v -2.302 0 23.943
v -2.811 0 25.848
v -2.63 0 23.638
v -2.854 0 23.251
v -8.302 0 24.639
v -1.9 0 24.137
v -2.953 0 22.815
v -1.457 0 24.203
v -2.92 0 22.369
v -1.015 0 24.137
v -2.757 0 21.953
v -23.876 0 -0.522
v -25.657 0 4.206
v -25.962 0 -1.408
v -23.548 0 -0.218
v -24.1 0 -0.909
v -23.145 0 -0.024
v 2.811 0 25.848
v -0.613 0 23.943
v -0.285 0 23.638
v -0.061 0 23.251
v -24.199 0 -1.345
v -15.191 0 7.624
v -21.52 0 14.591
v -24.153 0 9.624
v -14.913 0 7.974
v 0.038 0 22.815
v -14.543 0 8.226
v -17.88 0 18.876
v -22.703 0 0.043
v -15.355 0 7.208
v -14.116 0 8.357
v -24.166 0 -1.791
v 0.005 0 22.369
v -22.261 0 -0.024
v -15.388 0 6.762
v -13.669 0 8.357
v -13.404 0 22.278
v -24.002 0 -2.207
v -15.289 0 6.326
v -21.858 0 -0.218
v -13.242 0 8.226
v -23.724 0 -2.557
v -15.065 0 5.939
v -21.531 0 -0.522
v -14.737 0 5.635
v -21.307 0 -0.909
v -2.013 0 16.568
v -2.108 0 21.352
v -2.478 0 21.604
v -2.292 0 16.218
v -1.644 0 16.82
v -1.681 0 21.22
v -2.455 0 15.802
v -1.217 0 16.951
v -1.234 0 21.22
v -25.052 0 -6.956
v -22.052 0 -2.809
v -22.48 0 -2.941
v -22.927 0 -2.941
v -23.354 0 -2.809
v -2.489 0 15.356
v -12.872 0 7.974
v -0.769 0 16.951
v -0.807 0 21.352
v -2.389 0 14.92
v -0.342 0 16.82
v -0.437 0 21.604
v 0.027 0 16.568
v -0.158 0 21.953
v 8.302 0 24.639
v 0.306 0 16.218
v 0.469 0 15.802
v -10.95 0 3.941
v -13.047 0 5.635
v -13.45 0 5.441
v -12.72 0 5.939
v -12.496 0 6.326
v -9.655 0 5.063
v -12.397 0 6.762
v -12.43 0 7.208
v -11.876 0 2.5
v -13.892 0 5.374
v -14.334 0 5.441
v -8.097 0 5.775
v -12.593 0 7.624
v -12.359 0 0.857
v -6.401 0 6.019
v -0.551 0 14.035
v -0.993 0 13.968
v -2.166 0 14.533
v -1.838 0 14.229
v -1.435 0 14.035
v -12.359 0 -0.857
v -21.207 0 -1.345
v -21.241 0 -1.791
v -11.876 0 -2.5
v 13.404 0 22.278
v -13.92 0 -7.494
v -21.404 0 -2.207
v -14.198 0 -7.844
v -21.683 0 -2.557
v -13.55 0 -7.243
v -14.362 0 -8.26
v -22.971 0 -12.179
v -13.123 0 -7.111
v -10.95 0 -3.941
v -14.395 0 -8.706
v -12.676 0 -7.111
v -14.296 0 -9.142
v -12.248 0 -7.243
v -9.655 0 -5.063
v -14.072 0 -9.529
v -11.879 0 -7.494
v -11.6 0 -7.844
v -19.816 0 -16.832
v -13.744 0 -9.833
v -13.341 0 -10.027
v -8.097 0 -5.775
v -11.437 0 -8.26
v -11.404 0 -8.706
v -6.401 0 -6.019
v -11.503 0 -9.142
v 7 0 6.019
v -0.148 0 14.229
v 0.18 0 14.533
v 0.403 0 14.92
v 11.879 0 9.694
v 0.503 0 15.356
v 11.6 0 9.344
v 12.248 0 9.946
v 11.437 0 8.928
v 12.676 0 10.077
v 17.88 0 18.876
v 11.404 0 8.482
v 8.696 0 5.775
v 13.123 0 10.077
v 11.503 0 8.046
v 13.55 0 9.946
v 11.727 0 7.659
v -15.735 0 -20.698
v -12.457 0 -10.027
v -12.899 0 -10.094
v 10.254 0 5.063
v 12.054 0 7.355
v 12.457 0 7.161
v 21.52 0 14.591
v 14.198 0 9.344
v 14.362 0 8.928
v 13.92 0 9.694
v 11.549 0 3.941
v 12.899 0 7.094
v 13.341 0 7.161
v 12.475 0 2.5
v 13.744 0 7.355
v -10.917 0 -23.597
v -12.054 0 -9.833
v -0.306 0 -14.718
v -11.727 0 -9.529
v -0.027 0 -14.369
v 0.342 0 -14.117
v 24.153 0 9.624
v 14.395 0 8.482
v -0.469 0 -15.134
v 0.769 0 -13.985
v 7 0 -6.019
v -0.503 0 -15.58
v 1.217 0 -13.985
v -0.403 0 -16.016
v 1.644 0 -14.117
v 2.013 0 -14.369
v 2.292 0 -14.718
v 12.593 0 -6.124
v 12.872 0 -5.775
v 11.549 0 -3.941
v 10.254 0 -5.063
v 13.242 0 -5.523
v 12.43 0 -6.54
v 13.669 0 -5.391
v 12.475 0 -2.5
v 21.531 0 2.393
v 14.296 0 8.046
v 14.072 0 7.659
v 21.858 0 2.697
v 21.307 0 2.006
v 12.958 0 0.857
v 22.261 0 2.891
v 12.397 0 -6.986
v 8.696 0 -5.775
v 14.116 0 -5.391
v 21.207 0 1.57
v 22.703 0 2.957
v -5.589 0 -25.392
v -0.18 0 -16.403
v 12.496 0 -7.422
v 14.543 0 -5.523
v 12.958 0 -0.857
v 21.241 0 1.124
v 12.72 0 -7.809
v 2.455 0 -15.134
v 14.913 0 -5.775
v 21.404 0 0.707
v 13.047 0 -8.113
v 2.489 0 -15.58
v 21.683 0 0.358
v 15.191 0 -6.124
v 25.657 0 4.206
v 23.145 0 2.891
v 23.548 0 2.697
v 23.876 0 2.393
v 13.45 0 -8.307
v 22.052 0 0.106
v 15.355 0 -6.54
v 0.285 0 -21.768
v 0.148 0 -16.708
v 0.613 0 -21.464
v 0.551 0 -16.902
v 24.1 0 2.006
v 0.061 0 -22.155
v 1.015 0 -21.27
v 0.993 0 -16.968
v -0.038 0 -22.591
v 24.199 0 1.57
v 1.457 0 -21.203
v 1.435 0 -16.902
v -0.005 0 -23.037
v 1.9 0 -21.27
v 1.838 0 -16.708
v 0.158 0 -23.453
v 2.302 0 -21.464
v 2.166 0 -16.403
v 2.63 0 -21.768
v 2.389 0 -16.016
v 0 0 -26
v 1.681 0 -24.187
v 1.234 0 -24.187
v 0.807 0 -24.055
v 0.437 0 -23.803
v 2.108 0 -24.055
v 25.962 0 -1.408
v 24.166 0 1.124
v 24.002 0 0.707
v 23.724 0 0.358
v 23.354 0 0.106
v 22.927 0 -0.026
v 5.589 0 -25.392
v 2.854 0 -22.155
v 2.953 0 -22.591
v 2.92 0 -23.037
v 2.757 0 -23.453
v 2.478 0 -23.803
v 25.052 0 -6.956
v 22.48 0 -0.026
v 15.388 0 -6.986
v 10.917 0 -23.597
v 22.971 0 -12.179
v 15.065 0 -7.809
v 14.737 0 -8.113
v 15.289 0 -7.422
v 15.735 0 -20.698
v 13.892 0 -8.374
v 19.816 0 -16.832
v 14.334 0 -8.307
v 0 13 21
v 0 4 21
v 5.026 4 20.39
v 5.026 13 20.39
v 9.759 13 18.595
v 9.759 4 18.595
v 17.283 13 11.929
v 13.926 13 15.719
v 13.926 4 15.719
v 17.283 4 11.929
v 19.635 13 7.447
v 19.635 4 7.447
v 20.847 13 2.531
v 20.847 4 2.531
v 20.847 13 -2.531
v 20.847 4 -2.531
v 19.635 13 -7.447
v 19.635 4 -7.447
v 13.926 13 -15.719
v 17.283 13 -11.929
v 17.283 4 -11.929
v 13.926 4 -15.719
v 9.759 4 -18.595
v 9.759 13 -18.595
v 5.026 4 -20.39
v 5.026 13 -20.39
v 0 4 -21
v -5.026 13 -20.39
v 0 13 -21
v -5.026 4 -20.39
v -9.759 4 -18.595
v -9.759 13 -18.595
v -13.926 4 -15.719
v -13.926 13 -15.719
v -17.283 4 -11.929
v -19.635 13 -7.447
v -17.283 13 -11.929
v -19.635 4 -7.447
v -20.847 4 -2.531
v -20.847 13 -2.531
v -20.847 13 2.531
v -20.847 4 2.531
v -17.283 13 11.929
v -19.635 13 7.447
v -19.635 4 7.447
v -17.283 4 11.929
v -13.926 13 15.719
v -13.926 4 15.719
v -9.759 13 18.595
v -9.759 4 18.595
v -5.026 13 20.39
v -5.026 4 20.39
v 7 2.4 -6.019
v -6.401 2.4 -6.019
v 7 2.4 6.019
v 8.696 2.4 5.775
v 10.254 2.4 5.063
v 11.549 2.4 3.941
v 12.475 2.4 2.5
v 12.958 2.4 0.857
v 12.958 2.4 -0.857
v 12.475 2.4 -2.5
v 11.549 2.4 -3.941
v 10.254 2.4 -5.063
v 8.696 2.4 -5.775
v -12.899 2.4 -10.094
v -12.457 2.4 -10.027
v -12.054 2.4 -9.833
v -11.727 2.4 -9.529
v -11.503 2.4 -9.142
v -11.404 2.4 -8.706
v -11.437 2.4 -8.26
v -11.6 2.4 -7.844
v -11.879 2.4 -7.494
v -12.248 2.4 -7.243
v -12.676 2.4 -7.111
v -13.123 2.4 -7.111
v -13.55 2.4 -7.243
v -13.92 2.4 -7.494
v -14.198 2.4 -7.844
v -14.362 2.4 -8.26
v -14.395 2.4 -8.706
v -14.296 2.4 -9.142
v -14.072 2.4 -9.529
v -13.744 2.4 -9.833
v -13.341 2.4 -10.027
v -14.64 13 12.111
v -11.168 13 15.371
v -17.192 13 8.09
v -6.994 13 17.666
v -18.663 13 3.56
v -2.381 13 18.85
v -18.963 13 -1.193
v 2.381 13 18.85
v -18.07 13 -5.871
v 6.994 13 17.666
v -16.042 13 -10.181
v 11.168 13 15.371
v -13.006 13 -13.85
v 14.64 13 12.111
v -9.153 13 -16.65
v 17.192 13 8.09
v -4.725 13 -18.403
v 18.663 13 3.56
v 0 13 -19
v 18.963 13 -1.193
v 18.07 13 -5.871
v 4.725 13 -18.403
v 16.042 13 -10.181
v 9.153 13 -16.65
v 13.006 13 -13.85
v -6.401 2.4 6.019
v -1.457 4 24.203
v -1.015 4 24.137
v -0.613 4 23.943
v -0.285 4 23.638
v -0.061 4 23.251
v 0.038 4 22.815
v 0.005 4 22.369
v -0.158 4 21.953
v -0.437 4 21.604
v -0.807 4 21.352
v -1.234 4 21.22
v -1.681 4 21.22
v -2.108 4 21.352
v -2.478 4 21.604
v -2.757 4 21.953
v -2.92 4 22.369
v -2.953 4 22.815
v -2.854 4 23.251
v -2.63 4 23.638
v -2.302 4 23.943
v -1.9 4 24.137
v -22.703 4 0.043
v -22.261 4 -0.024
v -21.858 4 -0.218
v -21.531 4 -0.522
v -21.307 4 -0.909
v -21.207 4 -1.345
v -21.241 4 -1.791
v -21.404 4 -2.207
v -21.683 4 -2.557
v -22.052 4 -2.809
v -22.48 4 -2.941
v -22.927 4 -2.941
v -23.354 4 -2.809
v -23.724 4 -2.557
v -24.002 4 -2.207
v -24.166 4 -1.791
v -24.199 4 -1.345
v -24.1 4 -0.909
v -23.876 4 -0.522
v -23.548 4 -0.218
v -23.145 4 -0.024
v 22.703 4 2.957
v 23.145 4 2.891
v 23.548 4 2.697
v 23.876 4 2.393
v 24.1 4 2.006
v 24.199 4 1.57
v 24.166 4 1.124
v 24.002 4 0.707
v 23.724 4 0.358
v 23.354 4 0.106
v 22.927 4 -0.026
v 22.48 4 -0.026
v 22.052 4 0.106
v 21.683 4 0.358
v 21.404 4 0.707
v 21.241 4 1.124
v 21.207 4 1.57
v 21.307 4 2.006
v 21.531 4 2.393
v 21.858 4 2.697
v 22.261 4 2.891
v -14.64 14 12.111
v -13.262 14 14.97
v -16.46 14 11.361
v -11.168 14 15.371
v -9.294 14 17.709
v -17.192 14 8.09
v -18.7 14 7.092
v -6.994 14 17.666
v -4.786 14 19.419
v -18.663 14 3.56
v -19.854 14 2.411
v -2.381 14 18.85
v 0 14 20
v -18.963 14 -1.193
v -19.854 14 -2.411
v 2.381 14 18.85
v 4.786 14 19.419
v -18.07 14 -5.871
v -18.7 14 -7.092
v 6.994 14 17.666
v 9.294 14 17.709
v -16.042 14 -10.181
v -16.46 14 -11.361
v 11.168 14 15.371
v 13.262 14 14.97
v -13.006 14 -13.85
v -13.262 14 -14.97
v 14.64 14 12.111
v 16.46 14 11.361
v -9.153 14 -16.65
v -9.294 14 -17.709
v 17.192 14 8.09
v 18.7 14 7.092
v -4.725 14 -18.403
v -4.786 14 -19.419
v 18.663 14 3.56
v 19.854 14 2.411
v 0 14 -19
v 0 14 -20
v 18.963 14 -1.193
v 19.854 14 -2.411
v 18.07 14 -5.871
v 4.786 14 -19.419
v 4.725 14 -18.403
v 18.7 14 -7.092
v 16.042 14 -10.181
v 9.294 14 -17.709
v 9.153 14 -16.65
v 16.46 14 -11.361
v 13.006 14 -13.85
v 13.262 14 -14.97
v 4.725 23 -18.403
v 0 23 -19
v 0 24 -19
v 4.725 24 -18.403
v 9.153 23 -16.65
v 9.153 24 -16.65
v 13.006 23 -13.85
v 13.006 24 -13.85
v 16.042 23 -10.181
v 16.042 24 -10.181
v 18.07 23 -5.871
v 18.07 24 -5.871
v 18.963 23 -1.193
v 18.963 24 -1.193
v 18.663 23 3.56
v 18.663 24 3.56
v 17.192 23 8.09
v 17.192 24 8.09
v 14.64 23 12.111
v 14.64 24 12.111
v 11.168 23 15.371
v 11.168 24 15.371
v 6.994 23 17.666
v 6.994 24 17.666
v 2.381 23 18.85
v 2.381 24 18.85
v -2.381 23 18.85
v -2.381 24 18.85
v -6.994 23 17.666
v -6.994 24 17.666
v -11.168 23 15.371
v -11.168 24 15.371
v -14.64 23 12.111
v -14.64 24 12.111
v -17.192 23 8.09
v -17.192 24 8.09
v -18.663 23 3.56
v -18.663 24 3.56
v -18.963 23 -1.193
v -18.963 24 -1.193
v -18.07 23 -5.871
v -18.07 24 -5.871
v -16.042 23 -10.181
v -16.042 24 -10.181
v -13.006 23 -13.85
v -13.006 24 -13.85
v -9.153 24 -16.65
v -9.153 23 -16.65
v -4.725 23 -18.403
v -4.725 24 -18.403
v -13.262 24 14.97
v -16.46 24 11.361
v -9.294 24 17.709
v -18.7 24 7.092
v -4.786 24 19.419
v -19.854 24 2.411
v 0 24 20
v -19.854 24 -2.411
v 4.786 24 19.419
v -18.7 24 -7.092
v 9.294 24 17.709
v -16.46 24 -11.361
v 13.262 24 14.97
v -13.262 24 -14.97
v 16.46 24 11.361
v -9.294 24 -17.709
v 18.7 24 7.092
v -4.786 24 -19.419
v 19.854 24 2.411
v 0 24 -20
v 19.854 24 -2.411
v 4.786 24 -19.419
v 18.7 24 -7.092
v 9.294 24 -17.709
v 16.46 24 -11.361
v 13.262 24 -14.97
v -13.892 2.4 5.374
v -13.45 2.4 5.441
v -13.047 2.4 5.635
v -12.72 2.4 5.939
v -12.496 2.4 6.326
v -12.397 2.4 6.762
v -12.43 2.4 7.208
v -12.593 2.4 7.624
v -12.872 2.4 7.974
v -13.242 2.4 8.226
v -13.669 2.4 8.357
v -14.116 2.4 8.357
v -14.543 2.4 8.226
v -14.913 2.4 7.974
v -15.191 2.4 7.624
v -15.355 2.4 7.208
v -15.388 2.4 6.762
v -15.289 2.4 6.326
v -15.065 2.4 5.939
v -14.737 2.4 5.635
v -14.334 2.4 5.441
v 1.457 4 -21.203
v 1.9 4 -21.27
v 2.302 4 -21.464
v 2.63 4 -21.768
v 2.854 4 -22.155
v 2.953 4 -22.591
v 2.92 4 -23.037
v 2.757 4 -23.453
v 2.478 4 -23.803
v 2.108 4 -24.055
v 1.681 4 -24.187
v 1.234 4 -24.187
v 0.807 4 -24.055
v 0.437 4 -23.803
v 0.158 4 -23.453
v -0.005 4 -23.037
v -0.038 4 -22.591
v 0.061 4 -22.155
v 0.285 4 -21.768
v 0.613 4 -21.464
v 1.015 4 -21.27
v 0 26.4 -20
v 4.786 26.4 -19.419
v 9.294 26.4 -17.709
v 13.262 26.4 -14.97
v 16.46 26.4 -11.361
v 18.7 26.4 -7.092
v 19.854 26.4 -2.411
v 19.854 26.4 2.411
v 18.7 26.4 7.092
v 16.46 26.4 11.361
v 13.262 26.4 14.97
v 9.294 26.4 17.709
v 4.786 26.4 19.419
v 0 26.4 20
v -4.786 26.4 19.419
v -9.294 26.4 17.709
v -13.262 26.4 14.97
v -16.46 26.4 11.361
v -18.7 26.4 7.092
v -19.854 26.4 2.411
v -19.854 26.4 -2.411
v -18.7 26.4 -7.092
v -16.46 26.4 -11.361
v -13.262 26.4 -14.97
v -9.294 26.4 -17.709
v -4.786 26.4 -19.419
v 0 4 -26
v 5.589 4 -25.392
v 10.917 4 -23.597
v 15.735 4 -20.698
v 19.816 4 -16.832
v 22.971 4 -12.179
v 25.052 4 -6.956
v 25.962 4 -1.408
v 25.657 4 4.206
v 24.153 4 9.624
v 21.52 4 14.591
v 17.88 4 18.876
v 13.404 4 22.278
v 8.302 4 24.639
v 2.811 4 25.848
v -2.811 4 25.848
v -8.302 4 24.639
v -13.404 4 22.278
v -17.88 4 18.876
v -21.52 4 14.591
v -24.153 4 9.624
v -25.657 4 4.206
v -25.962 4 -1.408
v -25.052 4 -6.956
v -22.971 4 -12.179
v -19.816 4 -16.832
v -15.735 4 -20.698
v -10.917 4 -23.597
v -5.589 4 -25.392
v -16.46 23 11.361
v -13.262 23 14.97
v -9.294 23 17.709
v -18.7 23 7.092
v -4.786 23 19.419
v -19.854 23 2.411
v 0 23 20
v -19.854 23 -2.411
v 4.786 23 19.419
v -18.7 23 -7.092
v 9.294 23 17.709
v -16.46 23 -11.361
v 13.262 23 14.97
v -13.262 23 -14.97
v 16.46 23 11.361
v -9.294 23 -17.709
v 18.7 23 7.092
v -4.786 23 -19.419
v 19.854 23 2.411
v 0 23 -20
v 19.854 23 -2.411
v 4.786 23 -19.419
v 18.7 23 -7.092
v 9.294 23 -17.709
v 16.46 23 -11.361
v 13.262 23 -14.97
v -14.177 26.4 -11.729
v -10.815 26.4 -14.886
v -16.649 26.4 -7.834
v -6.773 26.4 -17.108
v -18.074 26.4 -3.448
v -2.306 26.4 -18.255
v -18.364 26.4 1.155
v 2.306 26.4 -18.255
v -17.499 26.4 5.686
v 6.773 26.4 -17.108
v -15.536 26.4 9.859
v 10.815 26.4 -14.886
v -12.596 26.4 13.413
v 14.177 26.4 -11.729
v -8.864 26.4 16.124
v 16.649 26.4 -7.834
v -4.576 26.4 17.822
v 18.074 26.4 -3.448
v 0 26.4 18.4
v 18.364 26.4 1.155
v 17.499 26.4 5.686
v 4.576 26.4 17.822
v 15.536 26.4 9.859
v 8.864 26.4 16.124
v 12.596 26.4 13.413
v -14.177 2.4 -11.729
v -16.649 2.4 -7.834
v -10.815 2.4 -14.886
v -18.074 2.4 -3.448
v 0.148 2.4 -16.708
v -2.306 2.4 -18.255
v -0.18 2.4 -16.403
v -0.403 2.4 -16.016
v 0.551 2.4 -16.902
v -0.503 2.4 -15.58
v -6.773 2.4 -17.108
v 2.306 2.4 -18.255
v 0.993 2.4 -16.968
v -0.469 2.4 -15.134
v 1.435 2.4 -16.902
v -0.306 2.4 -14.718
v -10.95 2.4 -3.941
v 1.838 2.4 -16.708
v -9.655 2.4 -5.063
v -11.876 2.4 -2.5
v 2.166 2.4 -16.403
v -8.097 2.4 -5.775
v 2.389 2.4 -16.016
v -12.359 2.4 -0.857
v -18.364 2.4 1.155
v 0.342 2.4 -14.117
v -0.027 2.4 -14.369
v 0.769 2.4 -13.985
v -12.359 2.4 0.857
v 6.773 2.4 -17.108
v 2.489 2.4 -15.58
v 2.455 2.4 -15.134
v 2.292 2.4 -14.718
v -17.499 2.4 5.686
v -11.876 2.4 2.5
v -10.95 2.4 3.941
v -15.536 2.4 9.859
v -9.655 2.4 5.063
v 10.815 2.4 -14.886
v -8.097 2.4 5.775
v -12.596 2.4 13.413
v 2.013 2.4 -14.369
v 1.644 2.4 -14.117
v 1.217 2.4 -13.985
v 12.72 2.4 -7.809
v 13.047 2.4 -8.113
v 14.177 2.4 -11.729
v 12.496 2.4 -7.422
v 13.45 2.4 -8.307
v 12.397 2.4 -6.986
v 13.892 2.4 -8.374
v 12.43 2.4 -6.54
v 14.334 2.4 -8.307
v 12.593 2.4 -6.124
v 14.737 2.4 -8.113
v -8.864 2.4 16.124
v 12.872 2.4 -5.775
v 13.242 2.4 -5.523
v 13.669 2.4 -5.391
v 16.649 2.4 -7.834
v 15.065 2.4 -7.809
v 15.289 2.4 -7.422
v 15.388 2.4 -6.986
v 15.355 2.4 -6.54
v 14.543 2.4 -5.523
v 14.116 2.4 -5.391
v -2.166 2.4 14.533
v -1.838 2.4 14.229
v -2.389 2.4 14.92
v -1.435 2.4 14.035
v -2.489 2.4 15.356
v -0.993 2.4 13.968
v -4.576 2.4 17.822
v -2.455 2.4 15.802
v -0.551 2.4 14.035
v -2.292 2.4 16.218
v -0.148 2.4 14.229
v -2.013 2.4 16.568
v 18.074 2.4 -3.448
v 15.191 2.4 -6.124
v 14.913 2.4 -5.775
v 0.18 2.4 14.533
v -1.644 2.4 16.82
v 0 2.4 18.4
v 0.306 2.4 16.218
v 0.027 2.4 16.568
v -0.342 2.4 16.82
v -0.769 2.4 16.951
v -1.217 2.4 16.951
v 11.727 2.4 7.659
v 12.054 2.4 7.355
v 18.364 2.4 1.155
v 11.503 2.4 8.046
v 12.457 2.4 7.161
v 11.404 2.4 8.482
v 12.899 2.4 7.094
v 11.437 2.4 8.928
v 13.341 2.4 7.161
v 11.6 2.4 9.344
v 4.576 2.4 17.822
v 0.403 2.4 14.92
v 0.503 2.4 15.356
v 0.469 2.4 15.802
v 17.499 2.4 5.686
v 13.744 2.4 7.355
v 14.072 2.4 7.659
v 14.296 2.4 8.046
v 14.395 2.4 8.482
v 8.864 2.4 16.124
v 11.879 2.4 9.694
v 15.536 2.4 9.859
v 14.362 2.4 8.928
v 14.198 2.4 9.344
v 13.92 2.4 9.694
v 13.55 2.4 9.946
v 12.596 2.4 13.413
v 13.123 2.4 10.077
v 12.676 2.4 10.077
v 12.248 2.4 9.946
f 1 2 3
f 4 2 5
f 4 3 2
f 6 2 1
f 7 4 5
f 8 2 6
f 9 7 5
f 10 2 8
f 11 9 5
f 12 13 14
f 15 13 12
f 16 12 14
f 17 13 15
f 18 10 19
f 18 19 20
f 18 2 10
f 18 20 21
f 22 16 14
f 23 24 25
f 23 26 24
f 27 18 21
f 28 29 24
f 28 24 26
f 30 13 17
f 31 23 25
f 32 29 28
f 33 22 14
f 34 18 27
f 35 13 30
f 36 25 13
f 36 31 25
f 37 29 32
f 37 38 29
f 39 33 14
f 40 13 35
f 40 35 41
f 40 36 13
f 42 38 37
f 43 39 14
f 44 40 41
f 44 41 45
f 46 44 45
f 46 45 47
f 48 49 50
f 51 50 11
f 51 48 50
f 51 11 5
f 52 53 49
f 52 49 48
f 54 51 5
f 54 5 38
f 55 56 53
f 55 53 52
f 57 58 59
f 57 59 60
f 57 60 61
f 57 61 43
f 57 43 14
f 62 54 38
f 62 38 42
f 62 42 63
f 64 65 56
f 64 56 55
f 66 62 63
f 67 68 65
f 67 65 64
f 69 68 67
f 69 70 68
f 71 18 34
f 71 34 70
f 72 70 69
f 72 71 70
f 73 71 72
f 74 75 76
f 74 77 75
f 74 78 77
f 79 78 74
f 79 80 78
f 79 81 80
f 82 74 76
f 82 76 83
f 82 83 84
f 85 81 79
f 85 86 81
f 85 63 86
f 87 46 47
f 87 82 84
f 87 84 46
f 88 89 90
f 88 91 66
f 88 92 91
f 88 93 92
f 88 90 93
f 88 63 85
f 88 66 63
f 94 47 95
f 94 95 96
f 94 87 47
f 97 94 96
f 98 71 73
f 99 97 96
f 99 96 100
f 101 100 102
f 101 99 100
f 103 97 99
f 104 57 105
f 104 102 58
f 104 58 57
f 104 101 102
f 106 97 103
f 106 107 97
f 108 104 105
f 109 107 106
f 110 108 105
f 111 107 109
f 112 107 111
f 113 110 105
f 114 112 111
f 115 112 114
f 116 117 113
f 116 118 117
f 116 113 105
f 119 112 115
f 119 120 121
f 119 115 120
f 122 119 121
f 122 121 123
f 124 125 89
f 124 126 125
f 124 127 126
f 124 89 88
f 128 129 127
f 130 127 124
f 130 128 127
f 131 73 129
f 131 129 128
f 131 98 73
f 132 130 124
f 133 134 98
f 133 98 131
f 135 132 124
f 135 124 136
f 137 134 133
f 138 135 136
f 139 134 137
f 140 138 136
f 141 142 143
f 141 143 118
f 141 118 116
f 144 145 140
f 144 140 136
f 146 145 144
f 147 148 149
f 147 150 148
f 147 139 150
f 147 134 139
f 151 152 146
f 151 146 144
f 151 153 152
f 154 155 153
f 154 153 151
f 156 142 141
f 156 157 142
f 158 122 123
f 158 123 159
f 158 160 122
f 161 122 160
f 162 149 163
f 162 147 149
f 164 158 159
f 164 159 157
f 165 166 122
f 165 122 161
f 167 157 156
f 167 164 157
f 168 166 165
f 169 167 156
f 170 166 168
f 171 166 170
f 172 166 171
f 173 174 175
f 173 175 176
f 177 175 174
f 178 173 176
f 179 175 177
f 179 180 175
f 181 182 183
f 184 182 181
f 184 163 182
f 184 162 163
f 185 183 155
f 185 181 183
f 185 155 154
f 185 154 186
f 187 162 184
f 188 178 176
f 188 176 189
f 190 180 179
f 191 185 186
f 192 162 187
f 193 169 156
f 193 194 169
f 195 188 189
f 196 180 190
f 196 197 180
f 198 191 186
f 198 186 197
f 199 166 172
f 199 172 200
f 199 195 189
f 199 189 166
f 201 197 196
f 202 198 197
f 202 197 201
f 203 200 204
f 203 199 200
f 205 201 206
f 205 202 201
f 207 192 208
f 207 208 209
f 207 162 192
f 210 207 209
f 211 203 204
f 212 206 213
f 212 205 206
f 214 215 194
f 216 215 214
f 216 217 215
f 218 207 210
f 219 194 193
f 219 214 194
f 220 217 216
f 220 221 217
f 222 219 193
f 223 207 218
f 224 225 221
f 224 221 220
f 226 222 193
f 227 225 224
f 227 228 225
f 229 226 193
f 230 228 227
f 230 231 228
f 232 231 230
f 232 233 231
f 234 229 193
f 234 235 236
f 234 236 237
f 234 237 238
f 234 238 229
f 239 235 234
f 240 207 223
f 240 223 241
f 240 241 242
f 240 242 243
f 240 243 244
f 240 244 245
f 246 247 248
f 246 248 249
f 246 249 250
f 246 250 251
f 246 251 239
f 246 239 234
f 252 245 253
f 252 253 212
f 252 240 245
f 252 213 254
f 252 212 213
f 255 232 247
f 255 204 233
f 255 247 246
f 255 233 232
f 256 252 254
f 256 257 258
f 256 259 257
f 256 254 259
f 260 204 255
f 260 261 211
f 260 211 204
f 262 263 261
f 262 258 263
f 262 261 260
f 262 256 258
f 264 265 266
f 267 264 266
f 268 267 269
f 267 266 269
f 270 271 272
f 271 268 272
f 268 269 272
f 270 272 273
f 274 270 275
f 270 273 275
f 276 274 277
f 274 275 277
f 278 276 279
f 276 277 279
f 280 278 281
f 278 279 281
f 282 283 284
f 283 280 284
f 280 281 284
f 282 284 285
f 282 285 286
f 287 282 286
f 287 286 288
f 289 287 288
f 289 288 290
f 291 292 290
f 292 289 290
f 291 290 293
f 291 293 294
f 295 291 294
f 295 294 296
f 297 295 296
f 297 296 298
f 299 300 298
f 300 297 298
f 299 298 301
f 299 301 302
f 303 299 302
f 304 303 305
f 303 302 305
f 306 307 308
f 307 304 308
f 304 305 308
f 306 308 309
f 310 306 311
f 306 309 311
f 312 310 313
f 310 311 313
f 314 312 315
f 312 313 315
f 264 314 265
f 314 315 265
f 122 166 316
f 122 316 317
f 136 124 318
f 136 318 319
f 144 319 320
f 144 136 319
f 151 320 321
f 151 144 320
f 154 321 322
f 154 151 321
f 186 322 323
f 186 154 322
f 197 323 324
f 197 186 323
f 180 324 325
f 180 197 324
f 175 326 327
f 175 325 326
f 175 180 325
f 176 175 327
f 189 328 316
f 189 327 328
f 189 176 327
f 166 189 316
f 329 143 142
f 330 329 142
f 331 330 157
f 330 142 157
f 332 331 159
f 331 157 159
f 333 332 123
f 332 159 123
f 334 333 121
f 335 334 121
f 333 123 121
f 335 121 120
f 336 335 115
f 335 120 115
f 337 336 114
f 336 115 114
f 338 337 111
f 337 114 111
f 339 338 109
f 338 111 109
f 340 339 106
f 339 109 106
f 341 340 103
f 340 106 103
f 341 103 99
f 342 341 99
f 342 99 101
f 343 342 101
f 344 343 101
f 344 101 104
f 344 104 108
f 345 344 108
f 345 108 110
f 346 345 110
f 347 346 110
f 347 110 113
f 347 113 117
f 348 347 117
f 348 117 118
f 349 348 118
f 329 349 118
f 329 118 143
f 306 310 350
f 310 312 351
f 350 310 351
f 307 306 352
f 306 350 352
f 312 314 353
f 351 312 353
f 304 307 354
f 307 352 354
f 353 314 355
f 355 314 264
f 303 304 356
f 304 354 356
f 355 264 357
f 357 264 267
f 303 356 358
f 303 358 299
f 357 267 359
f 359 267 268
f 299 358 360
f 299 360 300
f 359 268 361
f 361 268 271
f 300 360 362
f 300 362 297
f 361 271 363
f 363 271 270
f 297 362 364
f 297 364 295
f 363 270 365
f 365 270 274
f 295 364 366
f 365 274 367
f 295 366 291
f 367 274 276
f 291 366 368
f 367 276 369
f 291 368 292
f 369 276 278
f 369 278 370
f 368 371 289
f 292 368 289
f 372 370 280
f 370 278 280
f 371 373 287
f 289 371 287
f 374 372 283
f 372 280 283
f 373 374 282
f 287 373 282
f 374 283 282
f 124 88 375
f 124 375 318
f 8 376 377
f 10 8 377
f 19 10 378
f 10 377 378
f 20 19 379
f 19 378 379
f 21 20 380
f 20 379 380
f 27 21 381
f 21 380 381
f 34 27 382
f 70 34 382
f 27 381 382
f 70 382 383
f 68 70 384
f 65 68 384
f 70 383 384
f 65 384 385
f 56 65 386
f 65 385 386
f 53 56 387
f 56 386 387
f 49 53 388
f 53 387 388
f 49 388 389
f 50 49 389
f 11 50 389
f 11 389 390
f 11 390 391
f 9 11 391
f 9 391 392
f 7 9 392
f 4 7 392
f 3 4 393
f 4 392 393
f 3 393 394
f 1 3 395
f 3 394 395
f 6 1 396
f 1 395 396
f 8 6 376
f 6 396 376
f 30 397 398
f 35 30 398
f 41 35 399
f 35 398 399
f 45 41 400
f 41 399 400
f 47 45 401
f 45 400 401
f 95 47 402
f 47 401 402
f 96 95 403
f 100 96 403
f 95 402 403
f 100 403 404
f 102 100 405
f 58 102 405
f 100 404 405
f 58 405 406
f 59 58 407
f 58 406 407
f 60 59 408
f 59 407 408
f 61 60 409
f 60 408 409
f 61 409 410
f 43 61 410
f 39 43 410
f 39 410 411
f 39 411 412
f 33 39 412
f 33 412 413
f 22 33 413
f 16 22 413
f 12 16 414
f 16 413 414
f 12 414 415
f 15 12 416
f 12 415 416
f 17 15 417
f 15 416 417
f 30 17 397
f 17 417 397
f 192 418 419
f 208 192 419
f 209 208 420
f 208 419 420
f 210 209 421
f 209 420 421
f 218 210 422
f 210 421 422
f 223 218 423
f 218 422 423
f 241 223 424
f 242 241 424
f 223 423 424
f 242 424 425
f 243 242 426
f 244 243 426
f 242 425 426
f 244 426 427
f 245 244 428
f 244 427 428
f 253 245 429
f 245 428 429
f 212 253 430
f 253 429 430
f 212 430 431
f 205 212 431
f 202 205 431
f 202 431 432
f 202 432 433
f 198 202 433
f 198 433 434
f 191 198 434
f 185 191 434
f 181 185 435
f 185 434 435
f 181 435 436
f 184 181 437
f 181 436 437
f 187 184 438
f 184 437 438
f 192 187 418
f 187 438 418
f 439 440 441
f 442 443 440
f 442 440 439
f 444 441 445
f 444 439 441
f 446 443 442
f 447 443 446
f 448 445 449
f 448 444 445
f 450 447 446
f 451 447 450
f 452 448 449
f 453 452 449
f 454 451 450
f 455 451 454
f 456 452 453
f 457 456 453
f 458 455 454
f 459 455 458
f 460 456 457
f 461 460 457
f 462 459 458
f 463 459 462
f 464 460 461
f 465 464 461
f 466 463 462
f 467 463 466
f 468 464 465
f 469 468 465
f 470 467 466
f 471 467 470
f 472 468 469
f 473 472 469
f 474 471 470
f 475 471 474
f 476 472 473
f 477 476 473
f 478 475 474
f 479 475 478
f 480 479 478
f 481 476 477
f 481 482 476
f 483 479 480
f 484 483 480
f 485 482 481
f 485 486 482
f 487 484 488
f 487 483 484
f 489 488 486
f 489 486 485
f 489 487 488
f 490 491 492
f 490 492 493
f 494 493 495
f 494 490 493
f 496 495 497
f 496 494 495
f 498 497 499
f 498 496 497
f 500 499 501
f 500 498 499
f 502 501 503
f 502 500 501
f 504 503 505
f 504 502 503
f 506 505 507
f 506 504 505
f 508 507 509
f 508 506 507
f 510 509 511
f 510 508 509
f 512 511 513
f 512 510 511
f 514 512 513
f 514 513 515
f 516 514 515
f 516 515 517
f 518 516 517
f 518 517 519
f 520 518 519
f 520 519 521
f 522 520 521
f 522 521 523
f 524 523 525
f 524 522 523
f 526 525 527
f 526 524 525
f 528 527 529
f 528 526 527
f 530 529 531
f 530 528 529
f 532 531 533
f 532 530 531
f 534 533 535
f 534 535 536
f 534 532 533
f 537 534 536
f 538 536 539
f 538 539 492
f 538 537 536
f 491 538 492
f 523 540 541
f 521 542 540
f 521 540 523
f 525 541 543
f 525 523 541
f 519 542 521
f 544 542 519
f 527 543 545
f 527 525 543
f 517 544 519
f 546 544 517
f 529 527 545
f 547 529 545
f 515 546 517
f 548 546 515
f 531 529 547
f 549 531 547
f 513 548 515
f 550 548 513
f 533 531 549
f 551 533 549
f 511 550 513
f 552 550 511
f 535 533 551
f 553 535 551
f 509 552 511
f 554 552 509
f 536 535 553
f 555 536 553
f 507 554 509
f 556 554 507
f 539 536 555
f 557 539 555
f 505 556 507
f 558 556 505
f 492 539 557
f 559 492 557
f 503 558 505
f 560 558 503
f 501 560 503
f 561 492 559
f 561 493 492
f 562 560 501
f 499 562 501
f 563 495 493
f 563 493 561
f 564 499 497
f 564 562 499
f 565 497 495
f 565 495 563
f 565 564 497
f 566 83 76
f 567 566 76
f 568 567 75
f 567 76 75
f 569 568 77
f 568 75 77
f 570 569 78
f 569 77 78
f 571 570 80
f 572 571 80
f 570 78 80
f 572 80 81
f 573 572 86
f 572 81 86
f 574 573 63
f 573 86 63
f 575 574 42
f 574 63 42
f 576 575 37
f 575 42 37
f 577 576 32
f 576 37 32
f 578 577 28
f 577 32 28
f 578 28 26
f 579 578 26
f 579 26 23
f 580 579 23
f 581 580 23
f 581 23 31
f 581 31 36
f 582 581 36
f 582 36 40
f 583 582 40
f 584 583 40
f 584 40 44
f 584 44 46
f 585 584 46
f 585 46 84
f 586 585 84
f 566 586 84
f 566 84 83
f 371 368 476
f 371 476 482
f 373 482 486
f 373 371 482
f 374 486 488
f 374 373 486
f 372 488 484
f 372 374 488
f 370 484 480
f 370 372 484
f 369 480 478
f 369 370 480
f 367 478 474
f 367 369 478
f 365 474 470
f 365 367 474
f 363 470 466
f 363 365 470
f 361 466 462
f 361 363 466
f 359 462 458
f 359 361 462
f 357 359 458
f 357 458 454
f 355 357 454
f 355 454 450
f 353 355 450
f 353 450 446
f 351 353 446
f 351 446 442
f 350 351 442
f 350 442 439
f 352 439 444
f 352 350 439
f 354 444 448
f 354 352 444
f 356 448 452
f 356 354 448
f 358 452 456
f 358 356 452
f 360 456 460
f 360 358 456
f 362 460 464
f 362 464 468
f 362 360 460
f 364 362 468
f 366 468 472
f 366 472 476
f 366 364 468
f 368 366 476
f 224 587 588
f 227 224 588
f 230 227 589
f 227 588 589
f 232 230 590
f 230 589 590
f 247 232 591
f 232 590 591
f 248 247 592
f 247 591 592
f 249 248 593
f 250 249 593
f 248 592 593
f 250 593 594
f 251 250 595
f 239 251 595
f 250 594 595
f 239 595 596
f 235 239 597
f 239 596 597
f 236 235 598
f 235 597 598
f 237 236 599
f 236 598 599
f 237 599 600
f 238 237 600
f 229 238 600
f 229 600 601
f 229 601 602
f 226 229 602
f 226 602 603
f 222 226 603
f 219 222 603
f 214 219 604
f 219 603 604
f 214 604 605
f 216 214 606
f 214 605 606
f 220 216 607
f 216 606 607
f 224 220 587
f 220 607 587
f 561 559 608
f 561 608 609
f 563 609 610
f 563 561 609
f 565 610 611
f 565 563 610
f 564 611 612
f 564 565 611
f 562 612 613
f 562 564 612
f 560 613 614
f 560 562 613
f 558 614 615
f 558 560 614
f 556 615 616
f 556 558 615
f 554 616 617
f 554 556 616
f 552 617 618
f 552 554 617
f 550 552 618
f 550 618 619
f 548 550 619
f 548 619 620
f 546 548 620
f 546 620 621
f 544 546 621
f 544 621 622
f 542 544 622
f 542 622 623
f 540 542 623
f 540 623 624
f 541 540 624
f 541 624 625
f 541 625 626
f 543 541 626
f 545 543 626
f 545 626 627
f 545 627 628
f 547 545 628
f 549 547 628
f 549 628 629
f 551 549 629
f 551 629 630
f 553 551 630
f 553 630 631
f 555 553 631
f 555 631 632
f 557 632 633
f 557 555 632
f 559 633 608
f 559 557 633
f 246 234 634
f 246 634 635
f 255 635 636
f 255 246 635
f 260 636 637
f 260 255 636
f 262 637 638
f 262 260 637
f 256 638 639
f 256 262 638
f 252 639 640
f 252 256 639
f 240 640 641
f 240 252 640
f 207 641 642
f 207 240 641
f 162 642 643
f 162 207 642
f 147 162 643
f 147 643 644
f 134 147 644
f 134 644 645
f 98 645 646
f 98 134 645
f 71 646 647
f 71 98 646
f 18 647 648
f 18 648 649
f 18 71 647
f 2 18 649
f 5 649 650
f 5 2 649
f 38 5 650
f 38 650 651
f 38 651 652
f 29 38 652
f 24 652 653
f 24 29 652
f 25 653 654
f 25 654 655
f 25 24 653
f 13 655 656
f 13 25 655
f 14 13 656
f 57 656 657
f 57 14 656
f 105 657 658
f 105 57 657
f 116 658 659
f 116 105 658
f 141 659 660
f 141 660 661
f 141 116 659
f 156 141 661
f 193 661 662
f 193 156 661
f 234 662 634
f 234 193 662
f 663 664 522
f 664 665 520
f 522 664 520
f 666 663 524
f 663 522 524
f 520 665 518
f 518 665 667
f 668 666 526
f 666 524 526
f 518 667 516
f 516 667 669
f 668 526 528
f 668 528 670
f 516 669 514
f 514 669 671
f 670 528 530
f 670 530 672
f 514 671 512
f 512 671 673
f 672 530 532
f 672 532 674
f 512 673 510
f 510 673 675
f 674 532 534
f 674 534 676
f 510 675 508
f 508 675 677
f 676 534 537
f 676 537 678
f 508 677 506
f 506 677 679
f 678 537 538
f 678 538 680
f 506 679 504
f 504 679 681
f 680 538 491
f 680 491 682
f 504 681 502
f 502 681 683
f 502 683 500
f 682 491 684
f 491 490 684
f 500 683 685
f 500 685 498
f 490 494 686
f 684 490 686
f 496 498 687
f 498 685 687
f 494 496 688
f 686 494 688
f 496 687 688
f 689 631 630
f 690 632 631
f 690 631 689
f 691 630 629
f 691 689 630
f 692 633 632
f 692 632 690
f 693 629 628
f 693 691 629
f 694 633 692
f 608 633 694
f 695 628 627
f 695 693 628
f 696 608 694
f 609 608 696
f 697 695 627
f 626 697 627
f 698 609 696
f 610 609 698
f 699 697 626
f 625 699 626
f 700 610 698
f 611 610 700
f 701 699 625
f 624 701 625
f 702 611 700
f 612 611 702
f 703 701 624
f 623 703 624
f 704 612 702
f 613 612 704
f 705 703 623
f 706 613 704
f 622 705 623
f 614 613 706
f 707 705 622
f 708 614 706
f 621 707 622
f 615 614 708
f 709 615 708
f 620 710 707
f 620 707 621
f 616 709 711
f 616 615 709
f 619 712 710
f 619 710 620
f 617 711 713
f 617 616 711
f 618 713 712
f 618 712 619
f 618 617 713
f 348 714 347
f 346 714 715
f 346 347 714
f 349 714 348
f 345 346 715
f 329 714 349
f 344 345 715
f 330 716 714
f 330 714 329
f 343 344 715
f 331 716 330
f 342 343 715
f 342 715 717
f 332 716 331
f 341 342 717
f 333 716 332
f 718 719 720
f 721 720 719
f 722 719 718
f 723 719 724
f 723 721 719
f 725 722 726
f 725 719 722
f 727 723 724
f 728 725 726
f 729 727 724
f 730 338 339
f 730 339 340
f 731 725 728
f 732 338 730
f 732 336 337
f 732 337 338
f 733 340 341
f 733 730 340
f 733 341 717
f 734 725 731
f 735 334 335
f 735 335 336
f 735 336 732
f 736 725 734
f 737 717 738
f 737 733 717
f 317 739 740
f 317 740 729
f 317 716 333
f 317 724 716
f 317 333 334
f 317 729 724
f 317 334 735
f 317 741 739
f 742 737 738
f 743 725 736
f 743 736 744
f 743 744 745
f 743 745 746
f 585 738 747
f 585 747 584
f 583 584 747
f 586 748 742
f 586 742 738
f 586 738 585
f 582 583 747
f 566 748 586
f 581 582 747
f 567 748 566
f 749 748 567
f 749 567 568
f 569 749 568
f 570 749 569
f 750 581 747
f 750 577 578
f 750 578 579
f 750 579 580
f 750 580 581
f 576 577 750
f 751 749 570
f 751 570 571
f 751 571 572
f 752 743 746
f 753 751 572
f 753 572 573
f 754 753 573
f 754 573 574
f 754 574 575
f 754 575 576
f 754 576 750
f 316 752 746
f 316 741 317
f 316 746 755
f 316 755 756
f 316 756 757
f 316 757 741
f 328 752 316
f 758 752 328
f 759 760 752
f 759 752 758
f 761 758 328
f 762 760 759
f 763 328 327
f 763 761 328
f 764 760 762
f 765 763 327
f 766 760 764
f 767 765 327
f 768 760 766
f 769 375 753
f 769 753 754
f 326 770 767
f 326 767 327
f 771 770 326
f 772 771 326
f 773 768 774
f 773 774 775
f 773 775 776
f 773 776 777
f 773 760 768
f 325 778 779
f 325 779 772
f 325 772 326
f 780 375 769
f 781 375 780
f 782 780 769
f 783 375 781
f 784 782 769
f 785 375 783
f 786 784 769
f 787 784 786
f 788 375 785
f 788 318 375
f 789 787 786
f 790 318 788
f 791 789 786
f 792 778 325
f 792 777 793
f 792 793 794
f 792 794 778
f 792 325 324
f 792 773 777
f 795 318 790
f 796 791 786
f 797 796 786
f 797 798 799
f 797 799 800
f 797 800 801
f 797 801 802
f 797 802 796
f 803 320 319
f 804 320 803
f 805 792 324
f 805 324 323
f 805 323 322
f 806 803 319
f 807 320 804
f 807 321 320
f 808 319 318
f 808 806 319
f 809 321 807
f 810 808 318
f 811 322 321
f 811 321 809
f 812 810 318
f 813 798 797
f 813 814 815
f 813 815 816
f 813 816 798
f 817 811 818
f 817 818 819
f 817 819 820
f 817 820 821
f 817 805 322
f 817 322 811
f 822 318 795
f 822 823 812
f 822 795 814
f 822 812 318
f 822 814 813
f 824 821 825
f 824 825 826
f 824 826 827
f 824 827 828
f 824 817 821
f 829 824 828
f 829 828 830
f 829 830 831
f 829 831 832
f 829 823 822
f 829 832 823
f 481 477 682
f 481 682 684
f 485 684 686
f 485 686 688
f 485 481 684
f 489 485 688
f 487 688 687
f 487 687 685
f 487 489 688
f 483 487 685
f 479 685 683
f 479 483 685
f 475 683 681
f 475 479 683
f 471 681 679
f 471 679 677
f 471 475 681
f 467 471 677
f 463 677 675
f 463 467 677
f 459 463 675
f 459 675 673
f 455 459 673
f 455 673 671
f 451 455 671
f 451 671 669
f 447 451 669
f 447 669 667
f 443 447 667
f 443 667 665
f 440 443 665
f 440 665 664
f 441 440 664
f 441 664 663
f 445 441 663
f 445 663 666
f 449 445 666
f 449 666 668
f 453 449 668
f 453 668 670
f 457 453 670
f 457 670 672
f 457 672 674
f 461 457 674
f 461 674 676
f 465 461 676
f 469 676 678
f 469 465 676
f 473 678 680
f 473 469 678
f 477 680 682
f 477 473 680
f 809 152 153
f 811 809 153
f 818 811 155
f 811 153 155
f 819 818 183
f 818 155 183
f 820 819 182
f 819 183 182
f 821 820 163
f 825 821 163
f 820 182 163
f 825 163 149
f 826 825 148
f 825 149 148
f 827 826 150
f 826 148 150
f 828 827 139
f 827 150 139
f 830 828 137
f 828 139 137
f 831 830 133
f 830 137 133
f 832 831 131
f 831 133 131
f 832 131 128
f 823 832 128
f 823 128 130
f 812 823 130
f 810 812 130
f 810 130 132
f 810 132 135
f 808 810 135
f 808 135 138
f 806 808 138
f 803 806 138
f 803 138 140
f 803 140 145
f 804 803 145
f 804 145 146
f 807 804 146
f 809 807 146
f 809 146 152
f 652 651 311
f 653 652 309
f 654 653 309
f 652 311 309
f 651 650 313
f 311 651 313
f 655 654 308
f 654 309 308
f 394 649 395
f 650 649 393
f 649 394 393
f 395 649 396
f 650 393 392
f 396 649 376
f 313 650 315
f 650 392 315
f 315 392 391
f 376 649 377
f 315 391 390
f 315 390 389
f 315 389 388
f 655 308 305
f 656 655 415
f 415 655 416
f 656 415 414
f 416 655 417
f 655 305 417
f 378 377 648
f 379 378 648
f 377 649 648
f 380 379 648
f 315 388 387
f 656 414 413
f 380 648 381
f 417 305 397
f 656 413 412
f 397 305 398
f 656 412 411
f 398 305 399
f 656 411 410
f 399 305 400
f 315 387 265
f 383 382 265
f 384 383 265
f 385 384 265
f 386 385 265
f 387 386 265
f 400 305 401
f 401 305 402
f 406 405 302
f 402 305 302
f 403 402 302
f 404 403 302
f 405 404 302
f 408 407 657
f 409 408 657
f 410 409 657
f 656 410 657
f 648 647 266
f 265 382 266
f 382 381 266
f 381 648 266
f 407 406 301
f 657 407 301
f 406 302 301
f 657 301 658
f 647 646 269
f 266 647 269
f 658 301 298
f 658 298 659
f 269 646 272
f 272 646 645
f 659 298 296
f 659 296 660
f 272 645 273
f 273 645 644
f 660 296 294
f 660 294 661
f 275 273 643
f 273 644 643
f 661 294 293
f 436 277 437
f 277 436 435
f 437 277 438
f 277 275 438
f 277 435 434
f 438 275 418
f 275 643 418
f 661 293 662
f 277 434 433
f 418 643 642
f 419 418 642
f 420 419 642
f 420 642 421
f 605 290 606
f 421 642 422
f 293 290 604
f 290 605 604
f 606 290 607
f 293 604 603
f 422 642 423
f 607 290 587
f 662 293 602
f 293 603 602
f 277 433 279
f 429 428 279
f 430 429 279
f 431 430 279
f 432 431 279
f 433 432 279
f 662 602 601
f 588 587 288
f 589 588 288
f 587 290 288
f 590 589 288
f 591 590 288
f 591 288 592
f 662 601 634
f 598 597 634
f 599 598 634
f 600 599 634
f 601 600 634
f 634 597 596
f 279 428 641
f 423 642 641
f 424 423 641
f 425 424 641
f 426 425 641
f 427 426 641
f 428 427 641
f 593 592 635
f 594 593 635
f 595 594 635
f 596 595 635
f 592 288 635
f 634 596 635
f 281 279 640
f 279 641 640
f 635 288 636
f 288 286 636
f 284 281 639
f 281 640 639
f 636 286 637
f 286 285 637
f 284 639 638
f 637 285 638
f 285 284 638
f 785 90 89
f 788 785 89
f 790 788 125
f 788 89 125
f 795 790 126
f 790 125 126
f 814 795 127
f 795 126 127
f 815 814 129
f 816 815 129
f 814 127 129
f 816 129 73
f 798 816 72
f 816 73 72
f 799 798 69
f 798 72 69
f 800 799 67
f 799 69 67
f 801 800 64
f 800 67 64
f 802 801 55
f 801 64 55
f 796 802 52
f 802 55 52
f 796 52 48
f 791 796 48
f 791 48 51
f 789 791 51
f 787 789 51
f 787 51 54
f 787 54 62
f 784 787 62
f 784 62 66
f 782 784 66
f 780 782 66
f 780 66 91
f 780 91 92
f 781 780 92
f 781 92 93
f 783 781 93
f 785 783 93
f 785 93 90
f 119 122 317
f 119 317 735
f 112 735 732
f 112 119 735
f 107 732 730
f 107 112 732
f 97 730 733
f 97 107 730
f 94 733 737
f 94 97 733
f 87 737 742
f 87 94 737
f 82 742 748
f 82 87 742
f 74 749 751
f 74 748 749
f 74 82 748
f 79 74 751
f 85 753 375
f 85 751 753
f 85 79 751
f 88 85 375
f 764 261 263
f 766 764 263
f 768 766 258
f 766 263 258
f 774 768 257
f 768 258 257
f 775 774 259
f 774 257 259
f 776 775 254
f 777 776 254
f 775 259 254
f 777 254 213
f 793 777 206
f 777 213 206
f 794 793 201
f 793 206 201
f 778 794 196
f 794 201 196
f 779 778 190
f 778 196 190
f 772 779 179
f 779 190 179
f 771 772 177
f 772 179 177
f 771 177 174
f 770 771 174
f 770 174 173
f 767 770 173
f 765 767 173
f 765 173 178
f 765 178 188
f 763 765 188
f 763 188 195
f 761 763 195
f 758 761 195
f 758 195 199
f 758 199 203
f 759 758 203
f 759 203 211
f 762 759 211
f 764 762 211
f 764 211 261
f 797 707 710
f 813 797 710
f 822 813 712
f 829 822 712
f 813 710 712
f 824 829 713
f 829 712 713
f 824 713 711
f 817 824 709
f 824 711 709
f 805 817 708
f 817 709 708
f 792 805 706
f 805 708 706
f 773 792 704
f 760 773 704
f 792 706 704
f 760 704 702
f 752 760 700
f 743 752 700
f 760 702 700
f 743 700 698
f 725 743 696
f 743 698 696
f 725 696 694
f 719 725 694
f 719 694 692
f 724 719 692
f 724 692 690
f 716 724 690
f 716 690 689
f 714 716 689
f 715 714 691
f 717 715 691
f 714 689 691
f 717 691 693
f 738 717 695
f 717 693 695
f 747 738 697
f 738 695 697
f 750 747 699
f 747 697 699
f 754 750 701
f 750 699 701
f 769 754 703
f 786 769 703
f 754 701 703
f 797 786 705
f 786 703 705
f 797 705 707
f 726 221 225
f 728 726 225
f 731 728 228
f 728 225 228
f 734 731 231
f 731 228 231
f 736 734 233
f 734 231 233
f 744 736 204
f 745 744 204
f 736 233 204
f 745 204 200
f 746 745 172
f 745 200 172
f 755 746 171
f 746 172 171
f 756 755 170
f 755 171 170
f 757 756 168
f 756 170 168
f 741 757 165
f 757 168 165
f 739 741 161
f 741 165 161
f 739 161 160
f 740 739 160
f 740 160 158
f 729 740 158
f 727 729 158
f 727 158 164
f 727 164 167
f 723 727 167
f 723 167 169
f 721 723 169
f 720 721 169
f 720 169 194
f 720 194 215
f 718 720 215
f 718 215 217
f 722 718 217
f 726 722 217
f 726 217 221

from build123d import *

# Parameters (mm, degrees)
SKETCH_1_R           = 21
EXTRUDE_2_DEPTH      = 26.4
SKETCH_10_R          = 18.4
CUT_EXTRUDE_5_DEPTH  = 24
SKETCH_11_R          = 1.5
CUT_EXTRUDE_6_DEPTH  = 24
EXTRUDE_START        = 4
SKETCH_13_R          = 24.5
SKETCH_13_R_2        = 21
EXTRUDE_4_DEPTH      = 4
SKETCH_14_R          = 1.5
CUT_EXTRUDE_7_DEPTH  = 4
SKETCH_16_R          = 21
SKETCH_16_R_2        = 19
CUT_EXTRUDE_10_DEPTH = 1
SKETCH_27_R          = 21
SKETCH_27_R_2        = 20
CUT_EXTRUDE_14_DEPTH = 20
SKETCH_29_R          = 20
SKETCH_29_R_2        = 19
CUT_EXTRUDE_15_DEPTH = 1
CUT_EXTRUDE_16_DEPTH = 10
SKETCH_32_R          = 26
SKETCH_32_R_2        = 24.5
EXTRUDE_5_DEPTH      = 4


with BuildPart() as part:
    # 草图1 → 凸台-拉伸2 (new body)
    with BuildSketch(Plane(origin=(0, 0, 0), x_dir=(1, 0, 0), z_dir=(0, 1, 0))):
        with Locations(Location((0, 0, 0), (0, 0, 270))):
            Circle(SKETCH_1_R)
    extrude(amount=EXTRUDE_2_DEPTH)

    # 草图10 → 切除-拉伸5 (cut)
    with BuildSketch(Plane(origin=(0, 26.4, 0), x_dir=(1, 0, 0), z_dir=(0, 1, 0))):
        with Locations(Location((0, 0, 0), (0, 0, 270))):
            Circle(SKETCH_10_R)
    extrude(amount=-CUT_EXTRUDE_5_DEPTH, mode=Mode.SUBTRACT)

    # 草图11 → 切除-拉伸6 (cut)
    with BuildSketch(Plane.XZ):
        with Locations(Location((-0.993017559, 15.468158136, 0), (0, 0, 270))):
            Circle(SKETCH_11_R)
        with Locations(Location((12.899309116, 8.594057501, 0), (0, 0, 270))):
            Circle(SKETCH_11_R)
        with Locations(Location((13.892326675, -6.874100635, 0), (0, 0, 270))):
            Circle(SKETCH_11_R)
        with Locations(Location((0.993017559, -15.468158136, 0), (0, 0, 270))):
            Circle(SKETCH_11_R)
        with Locations(Location((-12.899309116, -8.594057501, 0), (0, 0, 270))):
            Circle(SKETCH_11_R)
        with Locations(Location((-13.892326675, 6.874100635, 0), (0, 0, 270))):
            Circle(SKETCH_11_R)
    extrude(amount=-CUT_EXTRUDE_6_DEPTH, mode=Mode.SUBTRACT)

    # 草图13 → 凸台-拉伸4 (add)
    with BuildSketch(Plane(origin=(0, 4, 0), x_dir=(-1, 0, 0), z_dir=(0, -1, 0)).offset(EXTRUDE_START)):
        with Locations(Location((0, 0, 0), (0, 0, 90))):
            Circle(SKETCH_13_R)
        with Locations(Location((0, 0, 0), (0, 0, 90))):
            Circle(SKETCH_13_R_2, mode=Mode.SUBTRACT)
    extrude(amount=-EXTRUDE_4_DEPTH)

    # 草图14 → 切除-拉伸7 (cut)
    with BuildSketch(Plane(origin=(0, 4, 0), x_dir=(1, 0, 0), z_dir=(0, 1, 0))):
        with Locations(Location((1.457493515, 22.703264361, 0), (0, 0, 270))):
            Circle(SKETCH_14_R)
        with Locations(Location((22.703264361, -1.457493515, 0), (0, 0, 270))):
            Circle(SKETCH_14_R)
        with Locations(Location((-1.457493515, -22.703264361, 0), (0, 0, 270))):
            Circle(SKETCH_14_R)
        with Locations(Location((-22.703264361, 1.457493515, 0), (0, 0, 270))):
            Circle(SKETCH_14_R)
    extrude(amount=-CUT_EXTRUDE_7_DEPTH, mode=Mode.SUBTRACT)

    # 草图16 → 切除-拉伸10 (cut)
    with BuildSketch(Plane(origin=(0, 13, 0), x_dir=(-1, 0, 0), z_dir=(0, -1, 0))):
        with Locations(Location((0, 0, 0), (0, 0, 90))):
            Circle(SKETCH_16_R)
        with Locations(Location((0, 0, 0), (0, 0, 90))):
            Circle(SKETCH_16_R_2, mode=Mode.SUBTRACT)
    extrude(amount=-CUT_EXTRUDE_10_DEPTH, mode=Mode.SUBTRACT)

    # 草图27 → 切除-拉伸14 (cut)
    with BuildSketch(Plane.XZ.offset(-14)):
        with Locations(Location((0, 0, 0), (0, 0, 270))):
            Circle(SKETCH_27_R)
        with Locations(Location((0, 0, 0), (0, 0, 270))):
            Circle(SKETCH_27_R_2, mode=Mode.SUBTRACT)
    extrude(amount=-CUT_EXTRUDE_14_DEPTH, mode=Mode.SUBTRACT)

    # 草图29 → 切除-拉伸15 (cut)
    with BuildSketch(Plane(origin=(0, 23, 0), x_dir=(-1, 0, 0), z_dir=(0, -1, 0))):
        with Locations(Location((0, 0, 0), (0, 0, 90))):
            Circle(SKETCH_29_R)
        with Locations(Location((0, 0, 0), (0, 0, 90))):
            Circle(SKETCH_29_R_2, mode=Mode.SUBTRACT)
    extrude(amount=-CUT_EXTRUDE_15_DEPTH, mode=Mode.SUBTRACT)

    # 草图31 → 切除-拉伸16 (cut)
    with BuildSketch(Plane.XZ):
        with BuildLine():
            Line((7, -6.018809273), (-6.401397723, -6.018809273))
            ThreePointArc((-6.401397723, -6.018809273), (-12.420206996, 0), (-6.401397723, 6.018809273))
            Line((-6.401397723, 6.018809273), (7, 6.018809273))
            ThreePointArc((7, 6.018809273), (13.018809273, 0), (7, -6.018809273))
        make_face()
    extrude(amount=-CUT_EXTRUDE_16_DEPTH, mode=Mode.SUBTRACT)

    # 草图32 → 凸台-拉伸5 (add)
    with BuildSketch(Plane.XZ):
        with Locations(Location((0, 0, 0), (0, 0, 270))):
            Circle(SKETCH_32_R)
        Circle(SKETCH_32_R_2, mode=Mode.SUBTRACT)
    extrude(amount=-EXTRUDE_5_DEPTH)


solid = part.part
